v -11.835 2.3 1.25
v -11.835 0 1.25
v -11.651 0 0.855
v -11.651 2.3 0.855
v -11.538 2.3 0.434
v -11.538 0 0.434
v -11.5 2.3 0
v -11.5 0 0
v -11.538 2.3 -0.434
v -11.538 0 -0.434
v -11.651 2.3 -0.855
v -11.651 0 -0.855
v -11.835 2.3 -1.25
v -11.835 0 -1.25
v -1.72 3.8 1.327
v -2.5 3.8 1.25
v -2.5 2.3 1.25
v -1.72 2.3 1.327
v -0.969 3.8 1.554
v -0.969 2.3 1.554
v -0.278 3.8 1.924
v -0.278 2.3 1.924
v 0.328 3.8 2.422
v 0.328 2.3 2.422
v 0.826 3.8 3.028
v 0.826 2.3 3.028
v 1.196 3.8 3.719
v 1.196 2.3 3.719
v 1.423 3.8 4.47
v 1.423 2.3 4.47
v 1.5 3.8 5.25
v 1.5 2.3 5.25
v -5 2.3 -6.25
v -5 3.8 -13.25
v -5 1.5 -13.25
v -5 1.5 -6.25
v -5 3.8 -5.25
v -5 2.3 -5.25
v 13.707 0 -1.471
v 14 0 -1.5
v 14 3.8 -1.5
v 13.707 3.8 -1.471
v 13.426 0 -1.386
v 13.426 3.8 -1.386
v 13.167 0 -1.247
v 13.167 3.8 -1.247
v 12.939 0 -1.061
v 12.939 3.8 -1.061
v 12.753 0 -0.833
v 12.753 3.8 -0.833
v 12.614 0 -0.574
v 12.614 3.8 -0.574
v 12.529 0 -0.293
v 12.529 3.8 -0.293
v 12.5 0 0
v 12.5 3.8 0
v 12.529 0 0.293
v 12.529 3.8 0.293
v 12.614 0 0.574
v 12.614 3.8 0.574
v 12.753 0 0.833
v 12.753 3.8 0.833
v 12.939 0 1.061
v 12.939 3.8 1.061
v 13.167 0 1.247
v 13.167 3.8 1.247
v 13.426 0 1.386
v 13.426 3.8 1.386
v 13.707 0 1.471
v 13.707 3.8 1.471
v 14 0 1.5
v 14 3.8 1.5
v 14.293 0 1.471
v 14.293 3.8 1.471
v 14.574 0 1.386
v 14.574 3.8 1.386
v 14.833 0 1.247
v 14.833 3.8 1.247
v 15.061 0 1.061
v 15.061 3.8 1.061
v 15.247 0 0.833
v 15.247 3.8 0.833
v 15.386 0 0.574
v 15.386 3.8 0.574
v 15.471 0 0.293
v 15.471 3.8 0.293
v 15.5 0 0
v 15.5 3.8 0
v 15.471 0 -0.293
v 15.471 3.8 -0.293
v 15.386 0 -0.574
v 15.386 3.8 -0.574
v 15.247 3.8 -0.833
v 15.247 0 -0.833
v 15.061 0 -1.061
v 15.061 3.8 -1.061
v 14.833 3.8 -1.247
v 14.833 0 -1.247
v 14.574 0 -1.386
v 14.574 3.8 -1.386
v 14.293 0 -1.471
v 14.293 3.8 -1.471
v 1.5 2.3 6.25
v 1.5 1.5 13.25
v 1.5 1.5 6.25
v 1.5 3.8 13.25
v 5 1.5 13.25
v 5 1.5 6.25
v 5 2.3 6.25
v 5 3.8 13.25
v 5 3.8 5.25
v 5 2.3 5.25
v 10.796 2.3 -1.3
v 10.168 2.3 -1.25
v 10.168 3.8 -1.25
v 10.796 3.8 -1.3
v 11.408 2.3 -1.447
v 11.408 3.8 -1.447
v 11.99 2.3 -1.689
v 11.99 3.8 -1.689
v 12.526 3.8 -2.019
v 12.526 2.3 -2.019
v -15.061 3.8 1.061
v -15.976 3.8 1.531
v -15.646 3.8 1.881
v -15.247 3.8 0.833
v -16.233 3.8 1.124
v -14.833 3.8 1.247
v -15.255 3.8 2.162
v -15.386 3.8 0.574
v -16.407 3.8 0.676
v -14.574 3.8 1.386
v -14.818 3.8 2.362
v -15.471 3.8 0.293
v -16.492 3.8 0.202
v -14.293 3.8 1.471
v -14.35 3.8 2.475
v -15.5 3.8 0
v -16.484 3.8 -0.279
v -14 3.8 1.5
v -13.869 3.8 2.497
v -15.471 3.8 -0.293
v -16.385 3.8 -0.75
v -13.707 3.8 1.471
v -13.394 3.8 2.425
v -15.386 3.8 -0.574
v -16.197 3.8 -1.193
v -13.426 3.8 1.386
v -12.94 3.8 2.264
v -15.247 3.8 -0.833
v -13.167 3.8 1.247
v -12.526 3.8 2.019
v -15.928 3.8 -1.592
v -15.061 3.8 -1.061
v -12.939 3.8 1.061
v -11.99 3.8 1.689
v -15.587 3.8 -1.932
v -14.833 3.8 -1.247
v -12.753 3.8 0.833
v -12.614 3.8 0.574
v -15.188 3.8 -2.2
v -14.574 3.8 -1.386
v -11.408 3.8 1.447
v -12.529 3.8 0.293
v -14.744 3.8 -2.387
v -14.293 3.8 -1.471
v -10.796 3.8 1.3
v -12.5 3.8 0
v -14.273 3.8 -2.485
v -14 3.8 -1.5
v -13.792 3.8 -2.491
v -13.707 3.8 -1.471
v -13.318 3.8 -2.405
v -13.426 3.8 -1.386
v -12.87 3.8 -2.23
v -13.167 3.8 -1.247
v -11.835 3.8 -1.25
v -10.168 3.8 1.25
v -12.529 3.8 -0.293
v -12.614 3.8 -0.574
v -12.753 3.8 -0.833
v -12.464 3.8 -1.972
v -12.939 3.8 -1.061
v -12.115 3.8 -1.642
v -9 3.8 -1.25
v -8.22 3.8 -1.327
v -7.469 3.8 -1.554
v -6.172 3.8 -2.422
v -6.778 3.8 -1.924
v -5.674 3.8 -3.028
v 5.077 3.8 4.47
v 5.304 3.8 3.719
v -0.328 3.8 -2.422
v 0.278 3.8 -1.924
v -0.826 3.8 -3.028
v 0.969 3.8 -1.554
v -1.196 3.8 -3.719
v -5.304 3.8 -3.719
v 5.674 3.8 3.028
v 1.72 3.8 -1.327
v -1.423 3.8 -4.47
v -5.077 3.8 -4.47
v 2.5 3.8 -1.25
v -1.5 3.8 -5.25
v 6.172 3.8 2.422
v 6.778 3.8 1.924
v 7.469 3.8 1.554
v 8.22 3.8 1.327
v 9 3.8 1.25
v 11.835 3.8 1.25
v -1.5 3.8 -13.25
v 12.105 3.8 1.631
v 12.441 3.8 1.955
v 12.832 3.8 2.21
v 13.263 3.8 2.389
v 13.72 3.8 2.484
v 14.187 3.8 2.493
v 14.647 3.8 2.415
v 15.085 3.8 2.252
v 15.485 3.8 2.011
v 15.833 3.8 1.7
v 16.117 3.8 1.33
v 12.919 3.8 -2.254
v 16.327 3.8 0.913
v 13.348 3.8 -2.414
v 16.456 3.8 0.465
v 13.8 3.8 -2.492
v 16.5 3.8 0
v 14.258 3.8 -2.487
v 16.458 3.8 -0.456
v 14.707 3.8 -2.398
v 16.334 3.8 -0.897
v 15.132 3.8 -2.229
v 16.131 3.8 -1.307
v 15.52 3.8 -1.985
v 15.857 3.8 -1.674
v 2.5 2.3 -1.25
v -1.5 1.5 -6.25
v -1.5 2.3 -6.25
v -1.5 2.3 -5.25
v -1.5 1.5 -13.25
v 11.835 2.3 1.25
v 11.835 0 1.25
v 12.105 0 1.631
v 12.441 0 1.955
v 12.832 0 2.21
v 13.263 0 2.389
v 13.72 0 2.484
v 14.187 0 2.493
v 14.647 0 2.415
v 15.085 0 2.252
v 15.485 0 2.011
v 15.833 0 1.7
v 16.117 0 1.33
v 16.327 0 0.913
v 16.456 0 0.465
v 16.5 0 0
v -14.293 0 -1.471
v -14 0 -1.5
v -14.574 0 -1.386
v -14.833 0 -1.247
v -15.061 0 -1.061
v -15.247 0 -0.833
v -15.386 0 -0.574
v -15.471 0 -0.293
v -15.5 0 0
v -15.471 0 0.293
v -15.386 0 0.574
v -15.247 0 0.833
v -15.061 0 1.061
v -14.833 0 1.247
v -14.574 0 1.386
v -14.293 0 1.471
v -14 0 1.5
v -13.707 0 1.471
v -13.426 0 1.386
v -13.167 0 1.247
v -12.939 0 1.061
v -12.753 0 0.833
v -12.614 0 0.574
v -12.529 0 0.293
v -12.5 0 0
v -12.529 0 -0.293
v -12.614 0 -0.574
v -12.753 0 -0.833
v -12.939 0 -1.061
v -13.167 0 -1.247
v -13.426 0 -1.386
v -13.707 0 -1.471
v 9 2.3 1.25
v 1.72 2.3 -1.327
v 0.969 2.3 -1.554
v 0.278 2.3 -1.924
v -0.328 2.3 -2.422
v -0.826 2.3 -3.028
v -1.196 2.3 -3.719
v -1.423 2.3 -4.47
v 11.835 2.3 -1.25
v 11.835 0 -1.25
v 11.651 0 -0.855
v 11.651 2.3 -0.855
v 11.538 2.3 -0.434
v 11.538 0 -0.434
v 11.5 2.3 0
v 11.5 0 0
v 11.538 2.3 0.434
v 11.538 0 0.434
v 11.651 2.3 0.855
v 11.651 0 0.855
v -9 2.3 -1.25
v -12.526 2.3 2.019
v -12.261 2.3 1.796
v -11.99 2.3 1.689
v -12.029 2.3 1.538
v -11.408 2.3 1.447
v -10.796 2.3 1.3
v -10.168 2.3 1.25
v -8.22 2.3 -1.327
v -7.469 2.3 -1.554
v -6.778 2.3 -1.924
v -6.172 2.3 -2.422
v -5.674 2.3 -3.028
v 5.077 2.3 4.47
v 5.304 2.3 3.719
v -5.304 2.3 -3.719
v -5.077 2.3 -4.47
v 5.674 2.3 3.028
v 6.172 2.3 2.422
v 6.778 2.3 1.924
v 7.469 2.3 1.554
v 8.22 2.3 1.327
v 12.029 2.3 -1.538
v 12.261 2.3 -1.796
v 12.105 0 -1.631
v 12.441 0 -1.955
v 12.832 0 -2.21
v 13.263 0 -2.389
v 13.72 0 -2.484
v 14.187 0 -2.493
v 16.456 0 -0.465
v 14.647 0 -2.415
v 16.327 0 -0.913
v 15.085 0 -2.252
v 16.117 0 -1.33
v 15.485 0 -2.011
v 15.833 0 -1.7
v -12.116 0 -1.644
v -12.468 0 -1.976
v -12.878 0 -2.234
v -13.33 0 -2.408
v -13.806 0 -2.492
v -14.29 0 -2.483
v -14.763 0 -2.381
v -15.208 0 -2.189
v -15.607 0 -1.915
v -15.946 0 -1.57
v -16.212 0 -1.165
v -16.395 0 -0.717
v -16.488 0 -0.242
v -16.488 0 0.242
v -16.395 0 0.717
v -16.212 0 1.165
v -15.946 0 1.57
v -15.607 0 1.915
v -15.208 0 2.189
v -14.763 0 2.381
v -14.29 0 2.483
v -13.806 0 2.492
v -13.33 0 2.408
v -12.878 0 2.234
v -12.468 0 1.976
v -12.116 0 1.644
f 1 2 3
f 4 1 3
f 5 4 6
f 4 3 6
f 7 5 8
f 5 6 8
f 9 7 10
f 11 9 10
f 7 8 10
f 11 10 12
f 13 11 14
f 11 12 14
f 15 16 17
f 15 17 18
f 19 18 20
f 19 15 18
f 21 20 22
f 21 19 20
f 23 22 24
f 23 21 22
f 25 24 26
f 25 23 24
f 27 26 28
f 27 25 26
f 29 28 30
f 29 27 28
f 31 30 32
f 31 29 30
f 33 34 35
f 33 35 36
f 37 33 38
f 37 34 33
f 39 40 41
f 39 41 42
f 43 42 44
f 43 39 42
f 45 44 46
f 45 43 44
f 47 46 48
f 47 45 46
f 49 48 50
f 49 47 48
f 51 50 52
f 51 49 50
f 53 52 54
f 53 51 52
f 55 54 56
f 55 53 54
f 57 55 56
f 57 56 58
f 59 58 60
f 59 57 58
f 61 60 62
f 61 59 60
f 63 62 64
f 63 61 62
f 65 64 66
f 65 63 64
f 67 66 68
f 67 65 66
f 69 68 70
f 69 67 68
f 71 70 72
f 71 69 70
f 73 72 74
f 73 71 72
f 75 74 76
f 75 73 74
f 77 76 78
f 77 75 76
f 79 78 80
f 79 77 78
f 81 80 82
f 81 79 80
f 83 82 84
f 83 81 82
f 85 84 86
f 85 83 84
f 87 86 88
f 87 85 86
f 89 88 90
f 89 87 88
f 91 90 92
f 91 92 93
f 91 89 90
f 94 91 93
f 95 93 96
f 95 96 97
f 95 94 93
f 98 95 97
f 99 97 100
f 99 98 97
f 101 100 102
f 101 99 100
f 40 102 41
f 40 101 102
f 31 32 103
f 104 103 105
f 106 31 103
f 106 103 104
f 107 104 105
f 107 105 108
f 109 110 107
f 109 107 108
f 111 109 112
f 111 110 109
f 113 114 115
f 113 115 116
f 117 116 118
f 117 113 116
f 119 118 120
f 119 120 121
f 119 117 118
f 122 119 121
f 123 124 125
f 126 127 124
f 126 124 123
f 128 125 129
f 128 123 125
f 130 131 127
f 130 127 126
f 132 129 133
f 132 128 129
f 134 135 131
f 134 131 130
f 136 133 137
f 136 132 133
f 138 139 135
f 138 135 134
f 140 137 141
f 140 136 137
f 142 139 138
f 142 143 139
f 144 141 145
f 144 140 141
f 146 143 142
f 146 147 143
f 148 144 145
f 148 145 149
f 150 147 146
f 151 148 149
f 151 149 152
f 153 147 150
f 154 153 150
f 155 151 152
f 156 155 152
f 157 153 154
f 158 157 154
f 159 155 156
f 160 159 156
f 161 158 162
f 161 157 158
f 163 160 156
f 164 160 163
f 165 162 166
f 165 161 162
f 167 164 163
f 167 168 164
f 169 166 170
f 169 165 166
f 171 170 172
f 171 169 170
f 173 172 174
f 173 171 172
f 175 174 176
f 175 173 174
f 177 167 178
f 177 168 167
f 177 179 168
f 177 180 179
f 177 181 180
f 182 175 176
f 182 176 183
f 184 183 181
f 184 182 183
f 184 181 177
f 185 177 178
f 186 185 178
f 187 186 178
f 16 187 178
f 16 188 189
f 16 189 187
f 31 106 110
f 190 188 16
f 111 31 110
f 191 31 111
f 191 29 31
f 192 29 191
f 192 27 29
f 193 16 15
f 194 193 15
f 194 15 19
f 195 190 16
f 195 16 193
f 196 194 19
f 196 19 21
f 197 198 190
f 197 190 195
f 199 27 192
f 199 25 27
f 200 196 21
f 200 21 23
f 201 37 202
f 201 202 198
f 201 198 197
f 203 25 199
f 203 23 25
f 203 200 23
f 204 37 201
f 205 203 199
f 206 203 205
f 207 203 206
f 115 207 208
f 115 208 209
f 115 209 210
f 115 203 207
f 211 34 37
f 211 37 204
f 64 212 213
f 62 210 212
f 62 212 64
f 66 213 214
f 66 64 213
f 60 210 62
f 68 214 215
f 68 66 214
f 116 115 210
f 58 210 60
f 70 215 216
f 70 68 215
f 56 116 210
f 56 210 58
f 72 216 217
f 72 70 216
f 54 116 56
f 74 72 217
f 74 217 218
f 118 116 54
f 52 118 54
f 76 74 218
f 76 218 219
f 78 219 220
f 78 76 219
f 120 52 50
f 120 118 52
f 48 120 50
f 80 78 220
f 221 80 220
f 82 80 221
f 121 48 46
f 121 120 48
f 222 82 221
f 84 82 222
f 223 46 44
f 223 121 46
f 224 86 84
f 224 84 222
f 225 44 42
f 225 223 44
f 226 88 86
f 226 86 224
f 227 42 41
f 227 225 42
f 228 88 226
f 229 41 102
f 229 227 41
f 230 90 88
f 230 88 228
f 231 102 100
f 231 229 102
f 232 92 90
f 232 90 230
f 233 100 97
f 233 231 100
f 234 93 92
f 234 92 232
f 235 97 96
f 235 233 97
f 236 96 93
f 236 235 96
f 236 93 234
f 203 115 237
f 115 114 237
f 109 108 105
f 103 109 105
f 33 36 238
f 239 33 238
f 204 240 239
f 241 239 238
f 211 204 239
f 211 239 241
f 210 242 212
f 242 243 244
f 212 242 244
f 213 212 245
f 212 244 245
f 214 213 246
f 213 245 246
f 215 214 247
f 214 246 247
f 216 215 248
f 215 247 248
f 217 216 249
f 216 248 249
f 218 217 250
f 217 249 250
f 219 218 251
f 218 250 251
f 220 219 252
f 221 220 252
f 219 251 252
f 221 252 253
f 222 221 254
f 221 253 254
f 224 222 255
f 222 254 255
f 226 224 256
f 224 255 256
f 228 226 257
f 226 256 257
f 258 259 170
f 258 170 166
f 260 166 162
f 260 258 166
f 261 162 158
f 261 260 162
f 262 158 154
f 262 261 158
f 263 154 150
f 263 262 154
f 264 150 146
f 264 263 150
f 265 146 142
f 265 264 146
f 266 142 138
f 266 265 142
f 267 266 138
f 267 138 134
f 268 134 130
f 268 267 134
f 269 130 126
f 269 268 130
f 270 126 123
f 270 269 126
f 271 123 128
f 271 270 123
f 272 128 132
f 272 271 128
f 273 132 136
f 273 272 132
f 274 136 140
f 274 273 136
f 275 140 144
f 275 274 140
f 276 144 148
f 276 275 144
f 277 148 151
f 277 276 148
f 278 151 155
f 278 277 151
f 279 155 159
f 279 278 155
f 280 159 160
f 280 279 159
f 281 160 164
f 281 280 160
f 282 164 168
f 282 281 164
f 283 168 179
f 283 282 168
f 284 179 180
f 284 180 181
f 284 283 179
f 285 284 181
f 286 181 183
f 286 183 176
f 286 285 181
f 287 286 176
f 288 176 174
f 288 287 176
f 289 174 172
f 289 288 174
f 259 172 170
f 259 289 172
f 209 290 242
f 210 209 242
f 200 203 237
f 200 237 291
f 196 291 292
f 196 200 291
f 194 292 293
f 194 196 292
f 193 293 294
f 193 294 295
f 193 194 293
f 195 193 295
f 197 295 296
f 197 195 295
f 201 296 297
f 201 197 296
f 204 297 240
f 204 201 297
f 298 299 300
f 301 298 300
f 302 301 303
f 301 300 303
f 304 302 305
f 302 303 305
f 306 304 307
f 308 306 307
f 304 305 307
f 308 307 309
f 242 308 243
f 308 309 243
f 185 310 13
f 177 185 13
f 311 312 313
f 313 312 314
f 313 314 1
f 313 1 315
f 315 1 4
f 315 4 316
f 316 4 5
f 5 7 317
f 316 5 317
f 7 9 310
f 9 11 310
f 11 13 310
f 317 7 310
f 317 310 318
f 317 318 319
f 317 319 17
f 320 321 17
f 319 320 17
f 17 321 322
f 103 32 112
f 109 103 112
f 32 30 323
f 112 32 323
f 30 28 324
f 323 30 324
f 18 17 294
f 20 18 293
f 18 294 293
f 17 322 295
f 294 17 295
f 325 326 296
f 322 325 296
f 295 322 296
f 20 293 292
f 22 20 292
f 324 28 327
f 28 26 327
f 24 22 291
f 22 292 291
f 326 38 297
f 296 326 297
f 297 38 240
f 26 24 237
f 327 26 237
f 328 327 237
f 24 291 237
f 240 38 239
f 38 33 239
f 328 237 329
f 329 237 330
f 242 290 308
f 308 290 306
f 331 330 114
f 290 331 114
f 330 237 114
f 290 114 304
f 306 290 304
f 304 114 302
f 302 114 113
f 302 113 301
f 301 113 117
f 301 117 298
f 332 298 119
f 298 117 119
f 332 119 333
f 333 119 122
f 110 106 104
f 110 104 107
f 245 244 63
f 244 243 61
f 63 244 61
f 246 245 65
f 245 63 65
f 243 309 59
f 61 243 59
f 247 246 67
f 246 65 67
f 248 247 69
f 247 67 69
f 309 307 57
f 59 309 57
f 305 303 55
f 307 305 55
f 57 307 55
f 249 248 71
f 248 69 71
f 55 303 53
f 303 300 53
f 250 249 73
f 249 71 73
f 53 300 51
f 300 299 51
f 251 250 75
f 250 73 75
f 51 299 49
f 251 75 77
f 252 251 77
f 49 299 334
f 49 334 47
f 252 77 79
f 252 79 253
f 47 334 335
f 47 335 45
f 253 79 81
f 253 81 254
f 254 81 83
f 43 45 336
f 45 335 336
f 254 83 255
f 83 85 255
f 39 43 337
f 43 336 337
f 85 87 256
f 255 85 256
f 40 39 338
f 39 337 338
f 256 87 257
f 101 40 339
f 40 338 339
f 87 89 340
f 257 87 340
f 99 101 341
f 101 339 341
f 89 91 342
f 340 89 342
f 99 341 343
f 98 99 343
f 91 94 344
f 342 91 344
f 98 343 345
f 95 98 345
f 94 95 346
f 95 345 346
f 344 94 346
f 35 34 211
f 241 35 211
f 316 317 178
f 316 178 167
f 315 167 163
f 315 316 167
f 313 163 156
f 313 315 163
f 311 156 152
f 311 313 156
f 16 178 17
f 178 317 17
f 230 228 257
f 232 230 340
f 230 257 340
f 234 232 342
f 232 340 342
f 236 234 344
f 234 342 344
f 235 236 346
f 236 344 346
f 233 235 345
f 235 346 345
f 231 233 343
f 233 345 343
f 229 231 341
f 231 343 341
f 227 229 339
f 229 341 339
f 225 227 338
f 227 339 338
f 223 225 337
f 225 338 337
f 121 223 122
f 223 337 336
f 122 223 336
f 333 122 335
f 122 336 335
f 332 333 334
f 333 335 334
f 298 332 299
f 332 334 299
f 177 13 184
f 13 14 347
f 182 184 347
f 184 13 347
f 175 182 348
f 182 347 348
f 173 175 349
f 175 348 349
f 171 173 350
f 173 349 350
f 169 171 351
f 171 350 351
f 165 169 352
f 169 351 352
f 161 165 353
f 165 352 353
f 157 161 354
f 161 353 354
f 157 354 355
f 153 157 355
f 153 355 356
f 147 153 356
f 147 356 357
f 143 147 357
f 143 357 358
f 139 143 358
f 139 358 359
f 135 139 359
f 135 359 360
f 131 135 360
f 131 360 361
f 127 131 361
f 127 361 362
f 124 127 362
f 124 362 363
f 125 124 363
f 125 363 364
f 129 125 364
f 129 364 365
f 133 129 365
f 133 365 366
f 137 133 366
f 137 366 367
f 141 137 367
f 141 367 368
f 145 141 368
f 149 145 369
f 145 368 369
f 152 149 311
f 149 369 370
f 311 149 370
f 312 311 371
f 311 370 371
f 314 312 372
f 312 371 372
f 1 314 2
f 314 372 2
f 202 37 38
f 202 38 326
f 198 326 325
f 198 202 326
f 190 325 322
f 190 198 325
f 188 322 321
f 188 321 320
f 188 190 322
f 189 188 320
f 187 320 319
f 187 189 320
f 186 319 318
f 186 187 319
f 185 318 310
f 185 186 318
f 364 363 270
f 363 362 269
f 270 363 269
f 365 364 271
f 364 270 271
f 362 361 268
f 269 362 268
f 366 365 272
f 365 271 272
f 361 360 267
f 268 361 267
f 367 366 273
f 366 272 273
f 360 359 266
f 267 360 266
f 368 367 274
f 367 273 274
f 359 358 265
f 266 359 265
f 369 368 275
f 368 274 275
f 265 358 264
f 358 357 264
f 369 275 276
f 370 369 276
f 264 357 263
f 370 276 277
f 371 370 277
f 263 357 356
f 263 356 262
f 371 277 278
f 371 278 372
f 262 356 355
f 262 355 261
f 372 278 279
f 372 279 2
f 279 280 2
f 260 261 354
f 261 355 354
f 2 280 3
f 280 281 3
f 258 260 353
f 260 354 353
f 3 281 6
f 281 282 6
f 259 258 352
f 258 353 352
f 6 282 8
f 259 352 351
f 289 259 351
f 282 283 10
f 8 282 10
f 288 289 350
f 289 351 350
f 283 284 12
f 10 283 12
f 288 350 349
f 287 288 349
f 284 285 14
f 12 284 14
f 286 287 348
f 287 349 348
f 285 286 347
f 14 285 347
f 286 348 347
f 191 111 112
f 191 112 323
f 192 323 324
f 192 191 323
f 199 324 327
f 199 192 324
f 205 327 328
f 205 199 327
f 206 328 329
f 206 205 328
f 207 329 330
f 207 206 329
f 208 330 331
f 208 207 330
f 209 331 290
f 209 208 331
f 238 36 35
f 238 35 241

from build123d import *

# Parameters (mm, degrees)
SKETCH1_R           = 1.5
BOSS_EXTRUDE2_DEPTH = 3.8
SKETCH2_W           = 3.5
SKETCH2_H           = 7
SKETCH2_H_2         = 5
BOSS_EXTRUDE3_DEPTH = 3.8
CUT_EXTRUDE1_DEPTH  = 2.3
SKETCH4_W           = 3.5
SKETCH4_H           = 7
CUT_EXTRUDE2_DEPTH  = 1.5
FILLET1_R           = 4


with BuildPart() as part:
    # Sketch1 → Boss-Extrude2 (new body)
    # profile 1 of 5: a face of its own
    with BuildSketch(Plane(origin=(0, 0, 0), x_dir=(1, 0, 0), z_dir=(0, 1, 0))):
        with BuildLine():
            Line((-11.834936491, -1.25), (-11.834936491, 1.25))
            ThreePointArc((-11.834936491, 1.25), (-16.5, 0), (-11.834936491, -1.25))
        make_face()
        with Locations(Location((-14, 0, 0), (0, 0, 90))):
            Circle(SKETCH1_R, mode=Mode.SUBTRACT)
    # profile 2 of 5: a face of its own
    with BuildSketch(Plane(origin=(0, 0, 0), x_dir=(1, 0, 0), z_dir=(0, 1, 0))):
        with BuildLine():
            ThreePointArc((-11.5, 0), (-11.585185434, 0.647047613), (-11.834936491, 1.25))
            Line((-11.834936491, 1.25), (-11.834936491, -1.25))
            ThreePointArc((-11.834936491, -1.25), (-11.585185434, -0.647047613), (-11.5, 0))
        make_face()
    # profile 3 of 5: a face of its own
    with BuildSketch(Plane(origin=(0, 0, 0), x_dir=(1, 0, 0), z_dir=(0, 1, 0))):
        with BuildLine():
            Line((11.834936491, 1.25), (-11.834936491, 1.25))
            ThreePointArc((-11.834936491, 1.25), (-11.585185434, 0.647047613), (-11.5, 0))
            ThreePointArc((-11.5, 0), (-11.585185434, -0.647047613), (-11.834936491, -1.25))
            Line((-11.834936491, -1.25), (11.834936491, -1.25))
            ThreePointArc((11.834936491, -1.25), (11.5, 0), (11.834936491, 1.25))
        make_face()
    # profile 4 of 5: a face of its own
    with BuildSketch(Plane(origin=(0, 0, 0), x_dir=(1, 0, 0), z_dir=(0, 1, 0))):
        with BuildLine():
            Line((11.834936491, -1.25), (11.834936491, 1.25))
            ThreePointArc((11.834936491, 1.25), (11.5, 0), (11.834936491, -1.25))
        make_face()
    # profile 5 of 5: a face of its own
    with BuildSketch(Plane(origin=(0, 0, 0), x_dir=(1, 0, 0), z_dir=(0, 1, 0))):
        with BuildLine():
            ThreePointArc((16.5, 0), (14.647047613, 2.414814566), (11.834936491, 1.25))
            Line((11.834936491, 1.25), (11.834936491, -1.25))
            ThreePointArc((11.834936491, -1.25), (14.647047613, -2.414814566), (16.5, 0))
        make_face()
        with Locations(Location((14, 0, 0), (0, 0, 90))):
            Circle(SKETCH1_R, mode=Mode.SUBTRACT)
    extrude(amount=BOSS_EXTRUDE2_DEPTH)

    # Sketch2 → Boss-Extrude3 (add)
    with BuildSketch(Plane(origin=(0, 3.8, 0), x_dir=(1, 0, 0), z_dir=(0, 1, 0))):
        with Locations((-3.25, 9.75)):
            Rectangle(SKETCH2_W, SKETCH2_H)
        with Locations((-3.25, 3.75)):
            Rectangle(SKETCH2_W, SKETCH2_H_2)
        with Locations((3.25, -3.75)):
            Rectangle(SKETCH2_W, SKETCH2_H_2)
        with Locations((3.25, -9.75)):
            Rectangle(SKETCH2_W, SKETCH2_H)
    extrude(amount=-BOSS_EXTRUDE3_DEPTH)

    # Sketch3 → Cut-Extrude1 (cut)
    with BuildSketch(Plane.XZ):
        with BuildLine():
            Line((5, 6.25), (1.5, 6.25))
            Line((1.5, 6.25), (1.5, 1.25))
            Line((1.5, 1.25), (-11.834936491, 1.25))
            ThreePointArc((-11.834936491, 1.25), (-11.5, 0), (-11.834936491, -1.25))
            Line((-11.834936491, -1.25), (-5, -1.25))
            Line((-5, -1.25), (-5, -6.25))
            Line((-5, -6.25), (-1.5, -6.25))
            Line((-1.5, -6.25), (-1.5, -1.25))
            Line((-1.5, -1.25), (11.834936491, -1.25))
            ThreePointArc((11.834936491, -1.25), (11.5, 0), (11.834936491, 1.25))
            Line((11.834936491, 1.25), (5, 1.25))
            Line((5, 1.25), (5, 6.25))
        make_face()
    extrude(amount=-CUT_EXTRUDE1_DEPTH, mode=Mode.SUBTRACT)

    # Sketch4 → Cut-Extrude2 (cut)
    with BuildSketch(Plane.XZ):
        with Locations((-3.25, -9.75)):
            Rectangle(SKETCH4_W, SKETCH4_H)
        with Locations((3.25, 9.75)):
            Rectangle(SKETCH4_W, SKETCH4_H)
    extrude(amount=-CUT_EXTRUDE2_DEPTH, mode=Mode.SUBTRACT)

    # Fillet1
    # the kernel refuses this fillet: 4 mm, written as the material it adds along each edge
    with BuildSketch(Plane(origin=(11.834936491, 2.3, -1.25), x_dir=(-1, 0, 0), z_dir=(0, 1, 0))) as fillet1_piece_1:
        with BuildLine():
            CenterArc((1.66736392, -4), FILLET1_R, 90, 36.128927472)
            ThreePointArc((-0.69105296, -0.769230769), (-0.305320518, -0.420735169), (0, 0))
            Line((0, 0), (1.66736392, 0))
        make_face()
    extrude(amount=1.5)
    with BuildSketch(Plane(origin=(-11.834936491, 2.3, 1.25), x_dir=(-0.668294067479168, 0, 0.743897196776644), z_dir=(0, 1, 0))) as fillet1_piece_2:
        with BuildLine():
            CenterArc((1.861299371, 3.913523616), FILLET1_R, 221.935536264, 36.128927472)
            Line((-1.114289416, 1.240347346), (0, 0))
            ThreePointArc((0, 0), (0.517027603, 0.05404774), (1.034055206, 0))
        make_face()
    extrude(amount=1.5)
    with BuildSketch(Plane(origin=(1.5, 3.8, 1.25), x_dir=(-1, 0, 0), z_dir=(0, -1, 0)), Plane(origin=(5, 3.8, 1.25), x_dir=(0, 0, 1), z_dir=(0, -1, 0))) as fillet1_piece_3:
        with BuildLine():
            CenterArc((FILLET1_R, -FILLET1_R), FILLET1_R, 90, 90)
            Line((0, -FILLET1_R), (0, 0))
            Line((0, 0), (FILLET1_R, 0))
        make_face()
    extrude(amount=1.5)
    with BuildSketch(Plane(origin=(-5, 3.8, -1.25), x_dir=(-1, 0, 0), z_dir=(0, -1, 0)), Plane(origin=(-1.5, 3.8, -1.25), x_dir=(0, 0, -1), z_dir=(0, -1, 0))) as fillet1_piece_4:
        with BuildLine():
            CenterArc((FILLET1_R, FILLET1_R), FILLET1_R, 180, 90)
            Line((0, FILLET1_R), (0, 0))
            Line((0, 0), (FILLET1_R, 0))
        make_face()
    extrude(amount=1.5)


solid = part.part
